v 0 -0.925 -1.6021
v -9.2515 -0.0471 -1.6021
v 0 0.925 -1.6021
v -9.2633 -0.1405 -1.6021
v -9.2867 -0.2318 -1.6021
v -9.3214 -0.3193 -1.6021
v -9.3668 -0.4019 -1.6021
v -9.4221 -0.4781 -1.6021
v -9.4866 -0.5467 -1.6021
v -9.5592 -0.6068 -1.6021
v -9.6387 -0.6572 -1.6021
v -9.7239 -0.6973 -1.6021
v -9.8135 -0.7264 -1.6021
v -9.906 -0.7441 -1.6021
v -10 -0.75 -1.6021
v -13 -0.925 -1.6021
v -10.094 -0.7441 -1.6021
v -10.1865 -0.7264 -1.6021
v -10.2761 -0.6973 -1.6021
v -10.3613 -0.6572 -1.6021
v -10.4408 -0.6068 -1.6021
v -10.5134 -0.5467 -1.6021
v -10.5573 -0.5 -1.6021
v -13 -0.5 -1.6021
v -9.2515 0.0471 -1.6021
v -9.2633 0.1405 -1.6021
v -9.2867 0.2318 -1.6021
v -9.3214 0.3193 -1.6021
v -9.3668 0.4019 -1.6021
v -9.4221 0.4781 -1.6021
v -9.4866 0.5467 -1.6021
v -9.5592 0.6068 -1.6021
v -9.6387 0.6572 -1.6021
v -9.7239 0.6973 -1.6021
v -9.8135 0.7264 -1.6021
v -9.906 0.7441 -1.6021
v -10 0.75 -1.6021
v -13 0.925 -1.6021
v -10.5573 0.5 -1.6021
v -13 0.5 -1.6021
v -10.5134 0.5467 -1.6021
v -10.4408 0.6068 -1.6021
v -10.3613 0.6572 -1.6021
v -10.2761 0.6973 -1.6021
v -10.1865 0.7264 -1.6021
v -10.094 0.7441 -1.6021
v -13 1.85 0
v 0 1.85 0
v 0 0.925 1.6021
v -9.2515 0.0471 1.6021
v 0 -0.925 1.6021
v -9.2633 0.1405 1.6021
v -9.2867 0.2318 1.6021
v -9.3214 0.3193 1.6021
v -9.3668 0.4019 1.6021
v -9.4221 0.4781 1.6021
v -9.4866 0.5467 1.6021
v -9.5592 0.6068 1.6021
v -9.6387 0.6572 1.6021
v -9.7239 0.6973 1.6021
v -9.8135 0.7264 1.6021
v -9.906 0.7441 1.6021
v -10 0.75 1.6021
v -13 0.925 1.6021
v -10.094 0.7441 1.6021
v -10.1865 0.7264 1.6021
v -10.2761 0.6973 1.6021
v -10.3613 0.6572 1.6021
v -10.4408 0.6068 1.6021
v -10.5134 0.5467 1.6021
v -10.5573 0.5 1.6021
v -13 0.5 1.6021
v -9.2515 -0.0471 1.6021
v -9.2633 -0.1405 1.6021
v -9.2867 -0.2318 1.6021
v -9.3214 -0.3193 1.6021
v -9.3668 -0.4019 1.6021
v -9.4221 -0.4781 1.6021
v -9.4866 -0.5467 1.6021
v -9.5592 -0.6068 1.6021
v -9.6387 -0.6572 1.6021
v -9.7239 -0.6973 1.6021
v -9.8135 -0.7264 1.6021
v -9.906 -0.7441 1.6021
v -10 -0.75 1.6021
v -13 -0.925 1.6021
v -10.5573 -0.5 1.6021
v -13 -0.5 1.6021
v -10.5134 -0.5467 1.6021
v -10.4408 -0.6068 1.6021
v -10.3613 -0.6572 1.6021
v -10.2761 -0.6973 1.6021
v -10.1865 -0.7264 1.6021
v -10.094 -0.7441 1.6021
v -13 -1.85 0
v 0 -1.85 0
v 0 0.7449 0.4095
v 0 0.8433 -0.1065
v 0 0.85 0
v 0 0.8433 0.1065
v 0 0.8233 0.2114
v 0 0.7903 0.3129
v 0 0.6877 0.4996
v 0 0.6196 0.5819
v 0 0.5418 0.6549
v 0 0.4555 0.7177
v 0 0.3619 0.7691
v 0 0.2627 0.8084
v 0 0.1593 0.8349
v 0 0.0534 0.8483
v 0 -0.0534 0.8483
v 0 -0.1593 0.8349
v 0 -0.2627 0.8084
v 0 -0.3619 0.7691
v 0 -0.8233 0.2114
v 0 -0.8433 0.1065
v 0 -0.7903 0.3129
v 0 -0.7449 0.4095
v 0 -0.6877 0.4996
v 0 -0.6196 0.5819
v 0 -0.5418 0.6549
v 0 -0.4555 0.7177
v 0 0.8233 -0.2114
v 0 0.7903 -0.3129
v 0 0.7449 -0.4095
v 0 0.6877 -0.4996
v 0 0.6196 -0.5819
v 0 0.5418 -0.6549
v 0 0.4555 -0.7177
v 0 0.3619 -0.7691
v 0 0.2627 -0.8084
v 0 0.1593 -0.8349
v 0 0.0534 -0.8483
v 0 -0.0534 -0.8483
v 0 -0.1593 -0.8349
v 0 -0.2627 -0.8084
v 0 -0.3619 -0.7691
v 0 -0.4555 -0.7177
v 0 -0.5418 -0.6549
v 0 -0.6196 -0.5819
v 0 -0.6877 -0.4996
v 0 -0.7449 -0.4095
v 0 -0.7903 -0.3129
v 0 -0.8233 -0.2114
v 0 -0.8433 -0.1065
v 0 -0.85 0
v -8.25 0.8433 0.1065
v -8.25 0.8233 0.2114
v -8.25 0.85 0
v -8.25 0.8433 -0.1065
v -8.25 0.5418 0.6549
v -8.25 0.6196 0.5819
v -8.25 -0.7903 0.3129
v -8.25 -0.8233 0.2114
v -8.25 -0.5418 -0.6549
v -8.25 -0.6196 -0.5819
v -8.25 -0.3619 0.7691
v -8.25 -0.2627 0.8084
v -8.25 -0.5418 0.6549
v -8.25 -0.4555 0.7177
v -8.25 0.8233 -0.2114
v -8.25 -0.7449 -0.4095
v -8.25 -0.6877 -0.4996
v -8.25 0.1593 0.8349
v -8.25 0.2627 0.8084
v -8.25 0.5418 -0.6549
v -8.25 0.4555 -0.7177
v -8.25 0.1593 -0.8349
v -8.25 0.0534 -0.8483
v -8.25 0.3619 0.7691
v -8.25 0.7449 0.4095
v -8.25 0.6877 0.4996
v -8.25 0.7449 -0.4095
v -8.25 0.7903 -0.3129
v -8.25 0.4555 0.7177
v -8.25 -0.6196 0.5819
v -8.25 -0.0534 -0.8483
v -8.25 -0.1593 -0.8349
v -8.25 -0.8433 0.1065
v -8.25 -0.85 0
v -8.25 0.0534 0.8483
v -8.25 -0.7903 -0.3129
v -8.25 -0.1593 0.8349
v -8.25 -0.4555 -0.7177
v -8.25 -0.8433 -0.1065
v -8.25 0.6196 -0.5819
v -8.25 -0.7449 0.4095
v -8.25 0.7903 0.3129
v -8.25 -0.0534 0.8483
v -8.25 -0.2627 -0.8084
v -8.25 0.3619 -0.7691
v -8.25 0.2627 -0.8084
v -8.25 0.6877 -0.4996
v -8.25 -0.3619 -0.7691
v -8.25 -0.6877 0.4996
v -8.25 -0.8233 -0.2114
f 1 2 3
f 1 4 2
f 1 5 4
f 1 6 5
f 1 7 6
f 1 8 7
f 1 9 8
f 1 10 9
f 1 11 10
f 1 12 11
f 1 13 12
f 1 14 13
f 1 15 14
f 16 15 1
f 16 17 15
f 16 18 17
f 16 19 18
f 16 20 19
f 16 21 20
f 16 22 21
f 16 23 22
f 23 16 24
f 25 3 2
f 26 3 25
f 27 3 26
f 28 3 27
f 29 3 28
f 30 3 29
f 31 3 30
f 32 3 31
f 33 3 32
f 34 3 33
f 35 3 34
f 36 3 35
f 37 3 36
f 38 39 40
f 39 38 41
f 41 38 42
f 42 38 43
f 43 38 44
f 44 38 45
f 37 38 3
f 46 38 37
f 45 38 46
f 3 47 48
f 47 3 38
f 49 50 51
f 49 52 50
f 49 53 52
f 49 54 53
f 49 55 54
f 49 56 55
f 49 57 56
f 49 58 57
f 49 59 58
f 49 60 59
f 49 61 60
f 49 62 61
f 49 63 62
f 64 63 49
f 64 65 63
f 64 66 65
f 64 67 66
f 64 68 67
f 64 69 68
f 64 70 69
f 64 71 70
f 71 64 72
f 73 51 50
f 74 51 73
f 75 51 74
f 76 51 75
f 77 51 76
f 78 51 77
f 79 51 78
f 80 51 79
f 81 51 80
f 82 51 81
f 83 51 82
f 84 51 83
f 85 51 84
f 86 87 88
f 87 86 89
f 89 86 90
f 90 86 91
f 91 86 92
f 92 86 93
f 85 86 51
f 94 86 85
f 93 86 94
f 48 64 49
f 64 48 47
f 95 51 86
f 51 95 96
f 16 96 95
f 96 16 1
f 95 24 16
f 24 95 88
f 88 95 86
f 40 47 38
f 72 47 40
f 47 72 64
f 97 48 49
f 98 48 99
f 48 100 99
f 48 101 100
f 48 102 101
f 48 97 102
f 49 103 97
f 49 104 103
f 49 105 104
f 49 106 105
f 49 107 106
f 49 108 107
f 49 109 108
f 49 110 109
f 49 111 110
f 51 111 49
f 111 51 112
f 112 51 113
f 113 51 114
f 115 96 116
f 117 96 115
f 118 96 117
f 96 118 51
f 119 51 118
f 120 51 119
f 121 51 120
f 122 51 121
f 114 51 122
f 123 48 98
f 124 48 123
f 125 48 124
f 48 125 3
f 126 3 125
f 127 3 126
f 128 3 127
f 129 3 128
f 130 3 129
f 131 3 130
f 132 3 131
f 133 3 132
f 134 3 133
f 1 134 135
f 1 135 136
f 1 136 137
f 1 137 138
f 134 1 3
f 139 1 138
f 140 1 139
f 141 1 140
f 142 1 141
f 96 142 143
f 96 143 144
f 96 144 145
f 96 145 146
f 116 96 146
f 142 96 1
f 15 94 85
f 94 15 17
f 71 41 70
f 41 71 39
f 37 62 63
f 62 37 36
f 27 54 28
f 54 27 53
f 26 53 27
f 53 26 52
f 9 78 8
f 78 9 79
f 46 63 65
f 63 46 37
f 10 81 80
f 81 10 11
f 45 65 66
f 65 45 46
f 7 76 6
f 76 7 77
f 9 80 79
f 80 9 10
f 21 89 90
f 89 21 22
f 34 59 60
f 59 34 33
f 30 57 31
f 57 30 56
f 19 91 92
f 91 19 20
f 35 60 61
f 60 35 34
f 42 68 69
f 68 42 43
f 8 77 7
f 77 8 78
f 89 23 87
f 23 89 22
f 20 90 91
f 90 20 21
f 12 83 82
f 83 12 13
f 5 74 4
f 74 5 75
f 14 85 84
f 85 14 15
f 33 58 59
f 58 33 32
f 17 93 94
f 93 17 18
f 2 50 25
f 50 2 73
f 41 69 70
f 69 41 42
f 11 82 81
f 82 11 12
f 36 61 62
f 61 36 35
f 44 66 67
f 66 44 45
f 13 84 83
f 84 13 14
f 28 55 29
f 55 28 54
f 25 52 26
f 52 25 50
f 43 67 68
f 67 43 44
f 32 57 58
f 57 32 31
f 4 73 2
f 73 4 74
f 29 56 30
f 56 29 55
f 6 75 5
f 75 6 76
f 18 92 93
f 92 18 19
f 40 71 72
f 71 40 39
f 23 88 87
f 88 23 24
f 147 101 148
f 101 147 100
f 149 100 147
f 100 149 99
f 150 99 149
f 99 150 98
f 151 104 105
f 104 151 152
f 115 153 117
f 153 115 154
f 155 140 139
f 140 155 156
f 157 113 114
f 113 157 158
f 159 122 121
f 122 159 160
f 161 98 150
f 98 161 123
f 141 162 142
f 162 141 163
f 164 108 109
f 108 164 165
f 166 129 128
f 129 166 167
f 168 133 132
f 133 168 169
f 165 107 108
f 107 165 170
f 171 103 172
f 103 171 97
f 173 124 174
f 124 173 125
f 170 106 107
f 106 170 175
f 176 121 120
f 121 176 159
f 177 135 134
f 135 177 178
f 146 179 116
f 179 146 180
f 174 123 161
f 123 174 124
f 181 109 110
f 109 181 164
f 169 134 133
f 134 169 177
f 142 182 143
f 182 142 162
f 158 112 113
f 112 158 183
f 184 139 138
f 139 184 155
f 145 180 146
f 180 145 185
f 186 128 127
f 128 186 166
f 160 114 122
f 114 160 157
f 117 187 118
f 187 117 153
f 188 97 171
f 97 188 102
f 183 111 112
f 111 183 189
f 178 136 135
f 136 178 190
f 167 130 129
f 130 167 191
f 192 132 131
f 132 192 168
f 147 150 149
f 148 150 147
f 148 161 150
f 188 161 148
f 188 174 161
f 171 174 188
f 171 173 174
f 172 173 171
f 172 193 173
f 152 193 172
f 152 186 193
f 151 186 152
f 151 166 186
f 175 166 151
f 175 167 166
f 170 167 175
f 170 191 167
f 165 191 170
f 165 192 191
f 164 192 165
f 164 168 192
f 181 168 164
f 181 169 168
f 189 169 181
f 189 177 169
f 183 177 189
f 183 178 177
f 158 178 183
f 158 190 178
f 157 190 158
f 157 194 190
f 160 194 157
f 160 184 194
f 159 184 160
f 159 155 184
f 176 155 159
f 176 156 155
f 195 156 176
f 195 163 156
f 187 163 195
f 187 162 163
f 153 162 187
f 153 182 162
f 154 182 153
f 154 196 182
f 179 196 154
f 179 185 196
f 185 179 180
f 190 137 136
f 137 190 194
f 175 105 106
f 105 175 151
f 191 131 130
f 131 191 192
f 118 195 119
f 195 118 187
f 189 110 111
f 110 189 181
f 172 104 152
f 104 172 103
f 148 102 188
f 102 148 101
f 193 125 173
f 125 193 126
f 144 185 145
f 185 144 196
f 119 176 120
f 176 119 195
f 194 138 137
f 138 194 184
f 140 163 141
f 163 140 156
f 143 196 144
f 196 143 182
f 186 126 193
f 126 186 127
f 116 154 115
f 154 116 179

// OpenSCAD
//CC BY-NC Katrien van Riet

//VARIABLES in mm!
diameter = 1.7;
length = 13;
depth = 9;
wall_thickness = 1; //at the corners
hole = 1.5;
fillet = .25;

visualisation = "no" ; //change to "yes" to preview rod placement



//BETTER NOT TO CHANGE THIS
radius = diameter/2+wall_thickness;
$fn=50;


//HERE BE CODE
mirror([1,0,0])
    rotate([90,0,90])
        if (visualisation == "yes") {
            color("Gray")
                translate([0,0,-hole/2-10])
                    cylinder(d=diameter+.01,h=depth+10);
        }
    
module cap(){
    color("LightBlue",.7)
    difference(){
            difference(){
                cylinder(d=diameter+wall_thickness*2, h=length, $fn=6);
                translate([0,diameter,depth+1])
                    rotate([90,0,0])
                        cylinder(d=hole,h=diameter*2);
                translate([0,0,length-(length-depth)/2+hole/2])
                    cube([hole/1.5,diameter*2,length-depth],center=true);
            }
                sphere(fillet,$fn=30);

        translate([0,0,-hole/2])
            cylinder(d=diameter,h=depth);
    }
}

mirror([1,0,0])
    rotate([90,0,90])
        cap();
